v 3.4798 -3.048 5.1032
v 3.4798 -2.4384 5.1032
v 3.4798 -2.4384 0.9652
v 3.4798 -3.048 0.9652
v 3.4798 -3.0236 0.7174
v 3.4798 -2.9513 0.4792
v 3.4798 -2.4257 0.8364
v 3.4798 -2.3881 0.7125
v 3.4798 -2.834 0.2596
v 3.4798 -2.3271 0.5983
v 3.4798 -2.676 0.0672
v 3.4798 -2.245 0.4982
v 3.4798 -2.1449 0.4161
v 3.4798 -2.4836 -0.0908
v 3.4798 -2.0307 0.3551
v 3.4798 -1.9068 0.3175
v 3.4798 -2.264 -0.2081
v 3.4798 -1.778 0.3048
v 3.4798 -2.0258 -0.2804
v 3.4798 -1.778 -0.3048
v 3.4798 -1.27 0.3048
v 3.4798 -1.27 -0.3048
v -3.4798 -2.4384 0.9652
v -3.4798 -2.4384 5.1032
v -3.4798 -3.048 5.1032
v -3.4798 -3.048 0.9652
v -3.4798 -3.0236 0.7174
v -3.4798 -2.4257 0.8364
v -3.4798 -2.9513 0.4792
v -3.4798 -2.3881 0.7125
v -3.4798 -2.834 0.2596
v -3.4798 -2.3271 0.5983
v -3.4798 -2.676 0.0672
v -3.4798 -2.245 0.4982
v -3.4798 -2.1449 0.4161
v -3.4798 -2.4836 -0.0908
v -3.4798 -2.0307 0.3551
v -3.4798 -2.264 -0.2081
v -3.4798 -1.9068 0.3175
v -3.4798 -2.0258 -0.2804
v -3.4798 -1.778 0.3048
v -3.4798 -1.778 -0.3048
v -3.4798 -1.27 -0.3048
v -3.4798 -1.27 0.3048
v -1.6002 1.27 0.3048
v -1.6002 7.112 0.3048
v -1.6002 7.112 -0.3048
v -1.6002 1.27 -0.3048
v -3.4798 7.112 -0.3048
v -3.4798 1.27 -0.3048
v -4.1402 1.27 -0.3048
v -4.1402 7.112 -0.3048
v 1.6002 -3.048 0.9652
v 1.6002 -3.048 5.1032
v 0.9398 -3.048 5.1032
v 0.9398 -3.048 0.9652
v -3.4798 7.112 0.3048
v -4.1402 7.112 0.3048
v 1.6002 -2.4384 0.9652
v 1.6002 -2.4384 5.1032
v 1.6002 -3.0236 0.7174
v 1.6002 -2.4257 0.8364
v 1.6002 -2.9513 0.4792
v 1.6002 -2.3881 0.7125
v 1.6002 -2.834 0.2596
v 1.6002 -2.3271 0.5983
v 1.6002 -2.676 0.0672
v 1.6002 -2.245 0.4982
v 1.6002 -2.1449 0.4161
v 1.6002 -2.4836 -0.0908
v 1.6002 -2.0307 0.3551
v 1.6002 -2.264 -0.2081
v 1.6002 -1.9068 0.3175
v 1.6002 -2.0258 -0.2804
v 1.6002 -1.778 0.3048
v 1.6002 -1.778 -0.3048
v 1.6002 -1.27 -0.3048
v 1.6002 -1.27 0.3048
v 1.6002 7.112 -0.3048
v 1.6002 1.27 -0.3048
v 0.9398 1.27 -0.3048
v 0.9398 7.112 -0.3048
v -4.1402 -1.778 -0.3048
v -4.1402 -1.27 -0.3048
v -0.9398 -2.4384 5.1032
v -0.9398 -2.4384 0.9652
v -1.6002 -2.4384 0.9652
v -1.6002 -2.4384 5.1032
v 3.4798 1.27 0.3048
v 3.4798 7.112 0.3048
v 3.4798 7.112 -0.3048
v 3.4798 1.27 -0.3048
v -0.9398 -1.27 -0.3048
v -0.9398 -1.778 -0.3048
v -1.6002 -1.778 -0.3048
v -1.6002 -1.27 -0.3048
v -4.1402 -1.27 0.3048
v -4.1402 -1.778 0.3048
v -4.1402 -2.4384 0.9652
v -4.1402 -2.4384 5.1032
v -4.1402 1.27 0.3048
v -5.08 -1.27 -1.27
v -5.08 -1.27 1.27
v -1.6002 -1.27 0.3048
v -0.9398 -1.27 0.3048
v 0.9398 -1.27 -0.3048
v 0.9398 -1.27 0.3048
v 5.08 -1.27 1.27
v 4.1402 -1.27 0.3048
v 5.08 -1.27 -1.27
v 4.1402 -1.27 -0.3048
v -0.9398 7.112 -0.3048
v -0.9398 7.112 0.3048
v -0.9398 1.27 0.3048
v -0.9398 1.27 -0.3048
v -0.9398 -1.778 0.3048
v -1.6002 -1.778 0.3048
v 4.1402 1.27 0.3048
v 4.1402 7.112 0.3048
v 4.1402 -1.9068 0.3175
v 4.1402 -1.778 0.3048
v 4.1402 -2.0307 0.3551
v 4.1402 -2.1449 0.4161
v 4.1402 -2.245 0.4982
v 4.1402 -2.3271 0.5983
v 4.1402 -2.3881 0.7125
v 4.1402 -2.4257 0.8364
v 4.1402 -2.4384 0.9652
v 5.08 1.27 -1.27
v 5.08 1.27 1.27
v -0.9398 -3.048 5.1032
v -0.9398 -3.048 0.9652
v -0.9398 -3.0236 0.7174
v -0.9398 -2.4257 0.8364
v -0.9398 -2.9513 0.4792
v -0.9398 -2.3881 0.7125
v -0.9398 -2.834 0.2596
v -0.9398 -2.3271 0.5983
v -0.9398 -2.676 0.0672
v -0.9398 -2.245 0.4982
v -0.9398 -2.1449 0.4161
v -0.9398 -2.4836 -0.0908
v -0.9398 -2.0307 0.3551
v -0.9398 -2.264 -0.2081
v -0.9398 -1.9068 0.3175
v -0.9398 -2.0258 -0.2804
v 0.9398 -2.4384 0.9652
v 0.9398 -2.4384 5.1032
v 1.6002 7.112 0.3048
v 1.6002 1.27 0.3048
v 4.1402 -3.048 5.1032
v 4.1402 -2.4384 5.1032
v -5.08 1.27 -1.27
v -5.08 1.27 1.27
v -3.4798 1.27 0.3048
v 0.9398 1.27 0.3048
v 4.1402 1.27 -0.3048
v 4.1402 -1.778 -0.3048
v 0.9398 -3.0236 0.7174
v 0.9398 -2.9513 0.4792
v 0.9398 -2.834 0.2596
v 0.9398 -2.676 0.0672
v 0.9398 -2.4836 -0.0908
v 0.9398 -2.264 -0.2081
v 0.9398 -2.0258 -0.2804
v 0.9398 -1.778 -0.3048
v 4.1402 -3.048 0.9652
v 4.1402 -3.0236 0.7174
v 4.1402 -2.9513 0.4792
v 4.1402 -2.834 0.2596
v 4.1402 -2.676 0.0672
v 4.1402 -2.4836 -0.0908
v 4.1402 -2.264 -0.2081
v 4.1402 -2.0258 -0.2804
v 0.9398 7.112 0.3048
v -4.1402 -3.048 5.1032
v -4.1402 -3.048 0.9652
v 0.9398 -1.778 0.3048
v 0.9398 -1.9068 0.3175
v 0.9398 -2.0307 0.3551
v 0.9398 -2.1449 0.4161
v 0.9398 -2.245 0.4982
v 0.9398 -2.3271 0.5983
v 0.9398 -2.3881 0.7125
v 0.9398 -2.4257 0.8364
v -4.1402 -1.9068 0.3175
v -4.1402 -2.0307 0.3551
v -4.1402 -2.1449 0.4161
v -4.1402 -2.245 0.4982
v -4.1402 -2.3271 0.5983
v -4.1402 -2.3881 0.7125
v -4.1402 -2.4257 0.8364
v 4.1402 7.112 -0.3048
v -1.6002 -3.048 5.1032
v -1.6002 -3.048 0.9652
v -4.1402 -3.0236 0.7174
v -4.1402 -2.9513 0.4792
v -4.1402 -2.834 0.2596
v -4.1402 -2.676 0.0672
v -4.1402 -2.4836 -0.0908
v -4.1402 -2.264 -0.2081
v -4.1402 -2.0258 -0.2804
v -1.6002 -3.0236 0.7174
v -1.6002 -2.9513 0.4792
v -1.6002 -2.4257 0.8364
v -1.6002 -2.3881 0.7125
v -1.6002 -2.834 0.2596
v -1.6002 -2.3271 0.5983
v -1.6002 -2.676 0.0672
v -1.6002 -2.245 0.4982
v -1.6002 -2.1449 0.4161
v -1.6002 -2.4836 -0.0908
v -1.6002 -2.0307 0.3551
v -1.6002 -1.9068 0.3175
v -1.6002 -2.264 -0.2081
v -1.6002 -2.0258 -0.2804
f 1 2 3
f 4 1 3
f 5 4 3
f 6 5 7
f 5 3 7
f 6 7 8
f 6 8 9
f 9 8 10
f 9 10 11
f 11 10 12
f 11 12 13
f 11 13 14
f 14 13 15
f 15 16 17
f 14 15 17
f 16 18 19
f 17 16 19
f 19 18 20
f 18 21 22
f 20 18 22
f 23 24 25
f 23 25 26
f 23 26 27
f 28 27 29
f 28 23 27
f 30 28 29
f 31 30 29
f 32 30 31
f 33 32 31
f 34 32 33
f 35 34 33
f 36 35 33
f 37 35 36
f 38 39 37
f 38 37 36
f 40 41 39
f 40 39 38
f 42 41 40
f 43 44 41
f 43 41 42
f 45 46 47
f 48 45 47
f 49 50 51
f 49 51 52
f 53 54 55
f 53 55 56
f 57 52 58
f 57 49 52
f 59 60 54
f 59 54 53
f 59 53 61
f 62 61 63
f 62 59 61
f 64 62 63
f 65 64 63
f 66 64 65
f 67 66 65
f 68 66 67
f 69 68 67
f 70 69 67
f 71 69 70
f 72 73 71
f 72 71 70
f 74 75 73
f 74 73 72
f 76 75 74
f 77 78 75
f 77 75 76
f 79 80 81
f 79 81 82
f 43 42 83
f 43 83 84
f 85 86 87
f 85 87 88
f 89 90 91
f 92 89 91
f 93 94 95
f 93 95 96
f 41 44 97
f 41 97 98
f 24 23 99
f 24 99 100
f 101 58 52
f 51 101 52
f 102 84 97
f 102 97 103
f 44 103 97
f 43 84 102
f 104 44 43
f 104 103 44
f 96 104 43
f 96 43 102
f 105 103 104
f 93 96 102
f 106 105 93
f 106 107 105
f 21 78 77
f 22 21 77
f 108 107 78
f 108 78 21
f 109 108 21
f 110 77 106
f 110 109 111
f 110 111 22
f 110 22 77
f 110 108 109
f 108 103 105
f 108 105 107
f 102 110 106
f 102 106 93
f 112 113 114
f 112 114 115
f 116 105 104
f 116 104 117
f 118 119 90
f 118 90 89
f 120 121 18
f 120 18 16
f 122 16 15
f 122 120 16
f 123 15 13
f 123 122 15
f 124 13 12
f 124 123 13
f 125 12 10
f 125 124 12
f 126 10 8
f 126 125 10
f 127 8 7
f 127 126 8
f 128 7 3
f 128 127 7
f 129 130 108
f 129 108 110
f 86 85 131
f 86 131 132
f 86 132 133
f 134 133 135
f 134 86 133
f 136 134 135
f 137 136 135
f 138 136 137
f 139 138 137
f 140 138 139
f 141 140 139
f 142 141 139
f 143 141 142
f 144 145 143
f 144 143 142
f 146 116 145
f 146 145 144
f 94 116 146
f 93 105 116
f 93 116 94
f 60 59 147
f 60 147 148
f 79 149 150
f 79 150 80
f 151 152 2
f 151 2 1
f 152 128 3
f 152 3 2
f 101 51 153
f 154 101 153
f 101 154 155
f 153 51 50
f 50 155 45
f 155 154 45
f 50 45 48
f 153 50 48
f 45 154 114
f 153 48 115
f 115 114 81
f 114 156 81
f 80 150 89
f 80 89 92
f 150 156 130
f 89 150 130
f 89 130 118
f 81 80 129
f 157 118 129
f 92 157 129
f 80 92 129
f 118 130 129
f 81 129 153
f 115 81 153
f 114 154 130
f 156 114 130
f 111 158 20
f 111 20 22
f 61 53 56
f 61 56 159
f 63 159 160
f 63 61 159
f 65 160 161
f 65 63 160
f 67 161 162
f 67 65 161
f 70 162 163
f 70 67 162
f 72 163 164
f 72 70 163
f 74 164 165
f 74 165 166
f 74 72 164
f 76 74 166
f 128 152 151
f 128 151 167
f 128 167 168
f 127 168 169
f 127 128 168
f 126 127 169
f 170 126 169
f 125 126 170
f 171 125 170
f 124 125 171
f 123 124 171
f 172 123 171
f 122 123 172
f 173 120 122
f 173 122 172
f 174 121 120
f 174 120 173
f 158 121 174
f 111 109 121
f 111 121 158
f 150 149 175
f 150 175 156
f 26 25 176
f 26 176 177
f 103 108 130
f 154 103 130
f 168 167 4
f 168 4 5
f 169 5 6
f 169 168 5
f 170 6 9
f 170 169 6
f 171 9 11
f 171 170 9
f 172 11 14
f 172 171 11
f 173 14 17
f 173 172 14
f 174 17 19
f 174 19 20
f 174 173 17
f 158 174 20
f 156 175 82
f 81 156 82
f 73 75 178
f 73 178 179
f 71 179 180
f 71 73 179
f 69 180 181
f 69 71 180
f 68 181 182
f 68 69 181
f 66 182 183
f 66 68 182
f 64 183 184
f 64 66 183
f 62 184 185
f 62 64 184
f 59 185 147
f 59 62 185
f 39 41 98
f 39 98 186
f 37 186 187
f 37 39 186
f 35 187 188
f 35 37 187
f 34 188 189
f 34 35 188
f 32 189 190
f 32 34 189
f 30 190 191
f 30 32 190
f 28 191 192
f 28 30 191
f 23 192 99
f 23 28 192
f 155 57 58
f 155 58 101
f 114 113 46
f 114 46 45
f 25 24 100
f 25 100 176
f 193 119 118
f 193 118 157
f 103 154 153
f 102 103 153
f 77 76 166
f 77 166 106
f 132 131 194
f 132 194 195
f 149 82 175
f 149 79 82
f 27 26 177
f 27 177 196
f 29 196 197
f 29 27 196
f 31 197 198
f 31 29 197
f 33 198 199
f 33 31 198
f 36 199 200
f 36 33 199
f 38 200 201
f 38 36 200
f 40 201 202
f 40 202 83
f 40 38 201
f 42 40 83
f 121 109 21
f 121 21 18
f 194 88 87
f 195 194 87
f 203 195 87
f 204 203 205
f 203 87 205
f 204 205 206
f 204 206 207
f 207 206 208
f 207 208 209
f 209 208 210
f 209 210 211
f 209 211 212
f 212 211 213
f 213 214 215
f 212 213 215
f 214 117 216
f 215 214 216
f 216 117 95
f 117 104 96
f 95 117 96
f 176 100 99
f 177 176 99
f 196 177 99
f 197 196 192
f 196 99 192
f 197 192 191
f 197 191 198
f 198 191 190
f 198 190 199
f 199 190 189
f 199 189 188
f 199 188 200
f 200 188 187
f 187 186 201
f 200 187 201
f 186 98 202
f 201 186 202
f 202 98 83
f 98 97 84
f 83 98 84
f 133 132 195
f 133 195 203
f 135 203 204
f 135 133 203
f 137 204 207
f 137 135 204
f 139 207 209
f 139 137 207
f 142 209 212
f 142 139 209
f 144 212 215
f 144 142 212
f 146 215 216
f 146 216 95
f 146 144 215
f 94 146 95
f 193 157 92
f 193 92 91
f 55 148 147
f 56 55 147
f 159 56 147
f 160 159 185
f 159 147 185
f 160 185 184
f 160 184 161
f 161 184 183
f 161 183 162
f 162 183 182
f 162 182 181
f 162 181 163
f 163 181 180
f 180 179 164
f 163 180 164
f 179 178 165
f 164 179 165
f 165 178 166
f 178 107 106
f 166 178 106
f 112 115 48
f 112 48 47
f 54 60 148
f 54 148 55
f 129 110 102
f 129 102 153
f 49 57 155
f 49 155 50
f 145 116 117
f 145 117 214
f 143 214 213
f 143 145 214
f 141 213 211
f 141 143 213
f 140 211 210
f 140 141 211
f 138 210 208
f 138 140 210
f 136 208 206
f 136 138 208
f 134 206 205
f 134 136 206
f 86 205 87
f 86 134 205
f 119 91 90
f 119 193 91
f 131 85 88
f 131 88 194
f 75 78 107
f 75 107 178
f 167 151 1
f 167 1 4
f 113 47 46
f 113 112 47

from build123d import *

# Parameters (mm, degrees)
SKETCH2_W           = 2.54
SKETCH2_H           = 2.54
BOSS_EXTRUDE1_DEPTH = 5.08
BOSS_EXTRUDE2_DEPTH = 0.3302
LPATTERN1_COUNT     = 4
LPATTERN1_PITCH     = 2.54


with BuildPart() as part:
    # Sketch2 → Boss-Extrude1 (new, symmetric)
    with BuildSketch(Plane(origin=(0, 0, 0), x_dir=(0, 0, -1), z_dir=(1, 0, 0))):
        Rectangle(SKETCH2_W, SKETCH2_H)
    extrude(amount=BOSS_EXTRUDE1_DEPTH, both=True)

    # Sketch3 → Boss-Extrude2 (add, symmetric)
    with BuildSketch(Plane(origin=(3.81, 0, 0), x_dir=(0, 0, -1), z_dir=(1, 0, 0))):
        with BuildLine():
            Line((-0.3048, 7.112), (-0.3048, -1.778))
            ThreePointArc((-0.3048, -1.778), (-0.498226682, -2.244973318), (-0.9652, -2.4384))
            Line((-0.9652, -2.4384), (-5.103190824, -2.4384))
            Line((-5.103190824, -2.4384), (-5.103190824, -3.048))
            Line((-5.103190824, -3.048), (-0.9652, -3.048))
            ThreePointArc((-0.9652, -3.048), (-0.067174388, -2.676025612), (0.3048, -1.778))
            Line((0.3048, -1.778), (0.3048, 7.112))
            Line((0.3048, 7.112), (-0.3048, 7.112))
        make_face()
    boss_extrude2 = extrude(amount=BOSS_EXTRUDE2_DEPTH, both=True)

    # LPattern1: Boss-Extrude2 ×4
    with Locations(*[(-i * LPATTERN1_PITCH, 0, 0) for i in range(1, LPATTERN1_COUNT)]):
        add(boss_extrude2)


solid = part.part
